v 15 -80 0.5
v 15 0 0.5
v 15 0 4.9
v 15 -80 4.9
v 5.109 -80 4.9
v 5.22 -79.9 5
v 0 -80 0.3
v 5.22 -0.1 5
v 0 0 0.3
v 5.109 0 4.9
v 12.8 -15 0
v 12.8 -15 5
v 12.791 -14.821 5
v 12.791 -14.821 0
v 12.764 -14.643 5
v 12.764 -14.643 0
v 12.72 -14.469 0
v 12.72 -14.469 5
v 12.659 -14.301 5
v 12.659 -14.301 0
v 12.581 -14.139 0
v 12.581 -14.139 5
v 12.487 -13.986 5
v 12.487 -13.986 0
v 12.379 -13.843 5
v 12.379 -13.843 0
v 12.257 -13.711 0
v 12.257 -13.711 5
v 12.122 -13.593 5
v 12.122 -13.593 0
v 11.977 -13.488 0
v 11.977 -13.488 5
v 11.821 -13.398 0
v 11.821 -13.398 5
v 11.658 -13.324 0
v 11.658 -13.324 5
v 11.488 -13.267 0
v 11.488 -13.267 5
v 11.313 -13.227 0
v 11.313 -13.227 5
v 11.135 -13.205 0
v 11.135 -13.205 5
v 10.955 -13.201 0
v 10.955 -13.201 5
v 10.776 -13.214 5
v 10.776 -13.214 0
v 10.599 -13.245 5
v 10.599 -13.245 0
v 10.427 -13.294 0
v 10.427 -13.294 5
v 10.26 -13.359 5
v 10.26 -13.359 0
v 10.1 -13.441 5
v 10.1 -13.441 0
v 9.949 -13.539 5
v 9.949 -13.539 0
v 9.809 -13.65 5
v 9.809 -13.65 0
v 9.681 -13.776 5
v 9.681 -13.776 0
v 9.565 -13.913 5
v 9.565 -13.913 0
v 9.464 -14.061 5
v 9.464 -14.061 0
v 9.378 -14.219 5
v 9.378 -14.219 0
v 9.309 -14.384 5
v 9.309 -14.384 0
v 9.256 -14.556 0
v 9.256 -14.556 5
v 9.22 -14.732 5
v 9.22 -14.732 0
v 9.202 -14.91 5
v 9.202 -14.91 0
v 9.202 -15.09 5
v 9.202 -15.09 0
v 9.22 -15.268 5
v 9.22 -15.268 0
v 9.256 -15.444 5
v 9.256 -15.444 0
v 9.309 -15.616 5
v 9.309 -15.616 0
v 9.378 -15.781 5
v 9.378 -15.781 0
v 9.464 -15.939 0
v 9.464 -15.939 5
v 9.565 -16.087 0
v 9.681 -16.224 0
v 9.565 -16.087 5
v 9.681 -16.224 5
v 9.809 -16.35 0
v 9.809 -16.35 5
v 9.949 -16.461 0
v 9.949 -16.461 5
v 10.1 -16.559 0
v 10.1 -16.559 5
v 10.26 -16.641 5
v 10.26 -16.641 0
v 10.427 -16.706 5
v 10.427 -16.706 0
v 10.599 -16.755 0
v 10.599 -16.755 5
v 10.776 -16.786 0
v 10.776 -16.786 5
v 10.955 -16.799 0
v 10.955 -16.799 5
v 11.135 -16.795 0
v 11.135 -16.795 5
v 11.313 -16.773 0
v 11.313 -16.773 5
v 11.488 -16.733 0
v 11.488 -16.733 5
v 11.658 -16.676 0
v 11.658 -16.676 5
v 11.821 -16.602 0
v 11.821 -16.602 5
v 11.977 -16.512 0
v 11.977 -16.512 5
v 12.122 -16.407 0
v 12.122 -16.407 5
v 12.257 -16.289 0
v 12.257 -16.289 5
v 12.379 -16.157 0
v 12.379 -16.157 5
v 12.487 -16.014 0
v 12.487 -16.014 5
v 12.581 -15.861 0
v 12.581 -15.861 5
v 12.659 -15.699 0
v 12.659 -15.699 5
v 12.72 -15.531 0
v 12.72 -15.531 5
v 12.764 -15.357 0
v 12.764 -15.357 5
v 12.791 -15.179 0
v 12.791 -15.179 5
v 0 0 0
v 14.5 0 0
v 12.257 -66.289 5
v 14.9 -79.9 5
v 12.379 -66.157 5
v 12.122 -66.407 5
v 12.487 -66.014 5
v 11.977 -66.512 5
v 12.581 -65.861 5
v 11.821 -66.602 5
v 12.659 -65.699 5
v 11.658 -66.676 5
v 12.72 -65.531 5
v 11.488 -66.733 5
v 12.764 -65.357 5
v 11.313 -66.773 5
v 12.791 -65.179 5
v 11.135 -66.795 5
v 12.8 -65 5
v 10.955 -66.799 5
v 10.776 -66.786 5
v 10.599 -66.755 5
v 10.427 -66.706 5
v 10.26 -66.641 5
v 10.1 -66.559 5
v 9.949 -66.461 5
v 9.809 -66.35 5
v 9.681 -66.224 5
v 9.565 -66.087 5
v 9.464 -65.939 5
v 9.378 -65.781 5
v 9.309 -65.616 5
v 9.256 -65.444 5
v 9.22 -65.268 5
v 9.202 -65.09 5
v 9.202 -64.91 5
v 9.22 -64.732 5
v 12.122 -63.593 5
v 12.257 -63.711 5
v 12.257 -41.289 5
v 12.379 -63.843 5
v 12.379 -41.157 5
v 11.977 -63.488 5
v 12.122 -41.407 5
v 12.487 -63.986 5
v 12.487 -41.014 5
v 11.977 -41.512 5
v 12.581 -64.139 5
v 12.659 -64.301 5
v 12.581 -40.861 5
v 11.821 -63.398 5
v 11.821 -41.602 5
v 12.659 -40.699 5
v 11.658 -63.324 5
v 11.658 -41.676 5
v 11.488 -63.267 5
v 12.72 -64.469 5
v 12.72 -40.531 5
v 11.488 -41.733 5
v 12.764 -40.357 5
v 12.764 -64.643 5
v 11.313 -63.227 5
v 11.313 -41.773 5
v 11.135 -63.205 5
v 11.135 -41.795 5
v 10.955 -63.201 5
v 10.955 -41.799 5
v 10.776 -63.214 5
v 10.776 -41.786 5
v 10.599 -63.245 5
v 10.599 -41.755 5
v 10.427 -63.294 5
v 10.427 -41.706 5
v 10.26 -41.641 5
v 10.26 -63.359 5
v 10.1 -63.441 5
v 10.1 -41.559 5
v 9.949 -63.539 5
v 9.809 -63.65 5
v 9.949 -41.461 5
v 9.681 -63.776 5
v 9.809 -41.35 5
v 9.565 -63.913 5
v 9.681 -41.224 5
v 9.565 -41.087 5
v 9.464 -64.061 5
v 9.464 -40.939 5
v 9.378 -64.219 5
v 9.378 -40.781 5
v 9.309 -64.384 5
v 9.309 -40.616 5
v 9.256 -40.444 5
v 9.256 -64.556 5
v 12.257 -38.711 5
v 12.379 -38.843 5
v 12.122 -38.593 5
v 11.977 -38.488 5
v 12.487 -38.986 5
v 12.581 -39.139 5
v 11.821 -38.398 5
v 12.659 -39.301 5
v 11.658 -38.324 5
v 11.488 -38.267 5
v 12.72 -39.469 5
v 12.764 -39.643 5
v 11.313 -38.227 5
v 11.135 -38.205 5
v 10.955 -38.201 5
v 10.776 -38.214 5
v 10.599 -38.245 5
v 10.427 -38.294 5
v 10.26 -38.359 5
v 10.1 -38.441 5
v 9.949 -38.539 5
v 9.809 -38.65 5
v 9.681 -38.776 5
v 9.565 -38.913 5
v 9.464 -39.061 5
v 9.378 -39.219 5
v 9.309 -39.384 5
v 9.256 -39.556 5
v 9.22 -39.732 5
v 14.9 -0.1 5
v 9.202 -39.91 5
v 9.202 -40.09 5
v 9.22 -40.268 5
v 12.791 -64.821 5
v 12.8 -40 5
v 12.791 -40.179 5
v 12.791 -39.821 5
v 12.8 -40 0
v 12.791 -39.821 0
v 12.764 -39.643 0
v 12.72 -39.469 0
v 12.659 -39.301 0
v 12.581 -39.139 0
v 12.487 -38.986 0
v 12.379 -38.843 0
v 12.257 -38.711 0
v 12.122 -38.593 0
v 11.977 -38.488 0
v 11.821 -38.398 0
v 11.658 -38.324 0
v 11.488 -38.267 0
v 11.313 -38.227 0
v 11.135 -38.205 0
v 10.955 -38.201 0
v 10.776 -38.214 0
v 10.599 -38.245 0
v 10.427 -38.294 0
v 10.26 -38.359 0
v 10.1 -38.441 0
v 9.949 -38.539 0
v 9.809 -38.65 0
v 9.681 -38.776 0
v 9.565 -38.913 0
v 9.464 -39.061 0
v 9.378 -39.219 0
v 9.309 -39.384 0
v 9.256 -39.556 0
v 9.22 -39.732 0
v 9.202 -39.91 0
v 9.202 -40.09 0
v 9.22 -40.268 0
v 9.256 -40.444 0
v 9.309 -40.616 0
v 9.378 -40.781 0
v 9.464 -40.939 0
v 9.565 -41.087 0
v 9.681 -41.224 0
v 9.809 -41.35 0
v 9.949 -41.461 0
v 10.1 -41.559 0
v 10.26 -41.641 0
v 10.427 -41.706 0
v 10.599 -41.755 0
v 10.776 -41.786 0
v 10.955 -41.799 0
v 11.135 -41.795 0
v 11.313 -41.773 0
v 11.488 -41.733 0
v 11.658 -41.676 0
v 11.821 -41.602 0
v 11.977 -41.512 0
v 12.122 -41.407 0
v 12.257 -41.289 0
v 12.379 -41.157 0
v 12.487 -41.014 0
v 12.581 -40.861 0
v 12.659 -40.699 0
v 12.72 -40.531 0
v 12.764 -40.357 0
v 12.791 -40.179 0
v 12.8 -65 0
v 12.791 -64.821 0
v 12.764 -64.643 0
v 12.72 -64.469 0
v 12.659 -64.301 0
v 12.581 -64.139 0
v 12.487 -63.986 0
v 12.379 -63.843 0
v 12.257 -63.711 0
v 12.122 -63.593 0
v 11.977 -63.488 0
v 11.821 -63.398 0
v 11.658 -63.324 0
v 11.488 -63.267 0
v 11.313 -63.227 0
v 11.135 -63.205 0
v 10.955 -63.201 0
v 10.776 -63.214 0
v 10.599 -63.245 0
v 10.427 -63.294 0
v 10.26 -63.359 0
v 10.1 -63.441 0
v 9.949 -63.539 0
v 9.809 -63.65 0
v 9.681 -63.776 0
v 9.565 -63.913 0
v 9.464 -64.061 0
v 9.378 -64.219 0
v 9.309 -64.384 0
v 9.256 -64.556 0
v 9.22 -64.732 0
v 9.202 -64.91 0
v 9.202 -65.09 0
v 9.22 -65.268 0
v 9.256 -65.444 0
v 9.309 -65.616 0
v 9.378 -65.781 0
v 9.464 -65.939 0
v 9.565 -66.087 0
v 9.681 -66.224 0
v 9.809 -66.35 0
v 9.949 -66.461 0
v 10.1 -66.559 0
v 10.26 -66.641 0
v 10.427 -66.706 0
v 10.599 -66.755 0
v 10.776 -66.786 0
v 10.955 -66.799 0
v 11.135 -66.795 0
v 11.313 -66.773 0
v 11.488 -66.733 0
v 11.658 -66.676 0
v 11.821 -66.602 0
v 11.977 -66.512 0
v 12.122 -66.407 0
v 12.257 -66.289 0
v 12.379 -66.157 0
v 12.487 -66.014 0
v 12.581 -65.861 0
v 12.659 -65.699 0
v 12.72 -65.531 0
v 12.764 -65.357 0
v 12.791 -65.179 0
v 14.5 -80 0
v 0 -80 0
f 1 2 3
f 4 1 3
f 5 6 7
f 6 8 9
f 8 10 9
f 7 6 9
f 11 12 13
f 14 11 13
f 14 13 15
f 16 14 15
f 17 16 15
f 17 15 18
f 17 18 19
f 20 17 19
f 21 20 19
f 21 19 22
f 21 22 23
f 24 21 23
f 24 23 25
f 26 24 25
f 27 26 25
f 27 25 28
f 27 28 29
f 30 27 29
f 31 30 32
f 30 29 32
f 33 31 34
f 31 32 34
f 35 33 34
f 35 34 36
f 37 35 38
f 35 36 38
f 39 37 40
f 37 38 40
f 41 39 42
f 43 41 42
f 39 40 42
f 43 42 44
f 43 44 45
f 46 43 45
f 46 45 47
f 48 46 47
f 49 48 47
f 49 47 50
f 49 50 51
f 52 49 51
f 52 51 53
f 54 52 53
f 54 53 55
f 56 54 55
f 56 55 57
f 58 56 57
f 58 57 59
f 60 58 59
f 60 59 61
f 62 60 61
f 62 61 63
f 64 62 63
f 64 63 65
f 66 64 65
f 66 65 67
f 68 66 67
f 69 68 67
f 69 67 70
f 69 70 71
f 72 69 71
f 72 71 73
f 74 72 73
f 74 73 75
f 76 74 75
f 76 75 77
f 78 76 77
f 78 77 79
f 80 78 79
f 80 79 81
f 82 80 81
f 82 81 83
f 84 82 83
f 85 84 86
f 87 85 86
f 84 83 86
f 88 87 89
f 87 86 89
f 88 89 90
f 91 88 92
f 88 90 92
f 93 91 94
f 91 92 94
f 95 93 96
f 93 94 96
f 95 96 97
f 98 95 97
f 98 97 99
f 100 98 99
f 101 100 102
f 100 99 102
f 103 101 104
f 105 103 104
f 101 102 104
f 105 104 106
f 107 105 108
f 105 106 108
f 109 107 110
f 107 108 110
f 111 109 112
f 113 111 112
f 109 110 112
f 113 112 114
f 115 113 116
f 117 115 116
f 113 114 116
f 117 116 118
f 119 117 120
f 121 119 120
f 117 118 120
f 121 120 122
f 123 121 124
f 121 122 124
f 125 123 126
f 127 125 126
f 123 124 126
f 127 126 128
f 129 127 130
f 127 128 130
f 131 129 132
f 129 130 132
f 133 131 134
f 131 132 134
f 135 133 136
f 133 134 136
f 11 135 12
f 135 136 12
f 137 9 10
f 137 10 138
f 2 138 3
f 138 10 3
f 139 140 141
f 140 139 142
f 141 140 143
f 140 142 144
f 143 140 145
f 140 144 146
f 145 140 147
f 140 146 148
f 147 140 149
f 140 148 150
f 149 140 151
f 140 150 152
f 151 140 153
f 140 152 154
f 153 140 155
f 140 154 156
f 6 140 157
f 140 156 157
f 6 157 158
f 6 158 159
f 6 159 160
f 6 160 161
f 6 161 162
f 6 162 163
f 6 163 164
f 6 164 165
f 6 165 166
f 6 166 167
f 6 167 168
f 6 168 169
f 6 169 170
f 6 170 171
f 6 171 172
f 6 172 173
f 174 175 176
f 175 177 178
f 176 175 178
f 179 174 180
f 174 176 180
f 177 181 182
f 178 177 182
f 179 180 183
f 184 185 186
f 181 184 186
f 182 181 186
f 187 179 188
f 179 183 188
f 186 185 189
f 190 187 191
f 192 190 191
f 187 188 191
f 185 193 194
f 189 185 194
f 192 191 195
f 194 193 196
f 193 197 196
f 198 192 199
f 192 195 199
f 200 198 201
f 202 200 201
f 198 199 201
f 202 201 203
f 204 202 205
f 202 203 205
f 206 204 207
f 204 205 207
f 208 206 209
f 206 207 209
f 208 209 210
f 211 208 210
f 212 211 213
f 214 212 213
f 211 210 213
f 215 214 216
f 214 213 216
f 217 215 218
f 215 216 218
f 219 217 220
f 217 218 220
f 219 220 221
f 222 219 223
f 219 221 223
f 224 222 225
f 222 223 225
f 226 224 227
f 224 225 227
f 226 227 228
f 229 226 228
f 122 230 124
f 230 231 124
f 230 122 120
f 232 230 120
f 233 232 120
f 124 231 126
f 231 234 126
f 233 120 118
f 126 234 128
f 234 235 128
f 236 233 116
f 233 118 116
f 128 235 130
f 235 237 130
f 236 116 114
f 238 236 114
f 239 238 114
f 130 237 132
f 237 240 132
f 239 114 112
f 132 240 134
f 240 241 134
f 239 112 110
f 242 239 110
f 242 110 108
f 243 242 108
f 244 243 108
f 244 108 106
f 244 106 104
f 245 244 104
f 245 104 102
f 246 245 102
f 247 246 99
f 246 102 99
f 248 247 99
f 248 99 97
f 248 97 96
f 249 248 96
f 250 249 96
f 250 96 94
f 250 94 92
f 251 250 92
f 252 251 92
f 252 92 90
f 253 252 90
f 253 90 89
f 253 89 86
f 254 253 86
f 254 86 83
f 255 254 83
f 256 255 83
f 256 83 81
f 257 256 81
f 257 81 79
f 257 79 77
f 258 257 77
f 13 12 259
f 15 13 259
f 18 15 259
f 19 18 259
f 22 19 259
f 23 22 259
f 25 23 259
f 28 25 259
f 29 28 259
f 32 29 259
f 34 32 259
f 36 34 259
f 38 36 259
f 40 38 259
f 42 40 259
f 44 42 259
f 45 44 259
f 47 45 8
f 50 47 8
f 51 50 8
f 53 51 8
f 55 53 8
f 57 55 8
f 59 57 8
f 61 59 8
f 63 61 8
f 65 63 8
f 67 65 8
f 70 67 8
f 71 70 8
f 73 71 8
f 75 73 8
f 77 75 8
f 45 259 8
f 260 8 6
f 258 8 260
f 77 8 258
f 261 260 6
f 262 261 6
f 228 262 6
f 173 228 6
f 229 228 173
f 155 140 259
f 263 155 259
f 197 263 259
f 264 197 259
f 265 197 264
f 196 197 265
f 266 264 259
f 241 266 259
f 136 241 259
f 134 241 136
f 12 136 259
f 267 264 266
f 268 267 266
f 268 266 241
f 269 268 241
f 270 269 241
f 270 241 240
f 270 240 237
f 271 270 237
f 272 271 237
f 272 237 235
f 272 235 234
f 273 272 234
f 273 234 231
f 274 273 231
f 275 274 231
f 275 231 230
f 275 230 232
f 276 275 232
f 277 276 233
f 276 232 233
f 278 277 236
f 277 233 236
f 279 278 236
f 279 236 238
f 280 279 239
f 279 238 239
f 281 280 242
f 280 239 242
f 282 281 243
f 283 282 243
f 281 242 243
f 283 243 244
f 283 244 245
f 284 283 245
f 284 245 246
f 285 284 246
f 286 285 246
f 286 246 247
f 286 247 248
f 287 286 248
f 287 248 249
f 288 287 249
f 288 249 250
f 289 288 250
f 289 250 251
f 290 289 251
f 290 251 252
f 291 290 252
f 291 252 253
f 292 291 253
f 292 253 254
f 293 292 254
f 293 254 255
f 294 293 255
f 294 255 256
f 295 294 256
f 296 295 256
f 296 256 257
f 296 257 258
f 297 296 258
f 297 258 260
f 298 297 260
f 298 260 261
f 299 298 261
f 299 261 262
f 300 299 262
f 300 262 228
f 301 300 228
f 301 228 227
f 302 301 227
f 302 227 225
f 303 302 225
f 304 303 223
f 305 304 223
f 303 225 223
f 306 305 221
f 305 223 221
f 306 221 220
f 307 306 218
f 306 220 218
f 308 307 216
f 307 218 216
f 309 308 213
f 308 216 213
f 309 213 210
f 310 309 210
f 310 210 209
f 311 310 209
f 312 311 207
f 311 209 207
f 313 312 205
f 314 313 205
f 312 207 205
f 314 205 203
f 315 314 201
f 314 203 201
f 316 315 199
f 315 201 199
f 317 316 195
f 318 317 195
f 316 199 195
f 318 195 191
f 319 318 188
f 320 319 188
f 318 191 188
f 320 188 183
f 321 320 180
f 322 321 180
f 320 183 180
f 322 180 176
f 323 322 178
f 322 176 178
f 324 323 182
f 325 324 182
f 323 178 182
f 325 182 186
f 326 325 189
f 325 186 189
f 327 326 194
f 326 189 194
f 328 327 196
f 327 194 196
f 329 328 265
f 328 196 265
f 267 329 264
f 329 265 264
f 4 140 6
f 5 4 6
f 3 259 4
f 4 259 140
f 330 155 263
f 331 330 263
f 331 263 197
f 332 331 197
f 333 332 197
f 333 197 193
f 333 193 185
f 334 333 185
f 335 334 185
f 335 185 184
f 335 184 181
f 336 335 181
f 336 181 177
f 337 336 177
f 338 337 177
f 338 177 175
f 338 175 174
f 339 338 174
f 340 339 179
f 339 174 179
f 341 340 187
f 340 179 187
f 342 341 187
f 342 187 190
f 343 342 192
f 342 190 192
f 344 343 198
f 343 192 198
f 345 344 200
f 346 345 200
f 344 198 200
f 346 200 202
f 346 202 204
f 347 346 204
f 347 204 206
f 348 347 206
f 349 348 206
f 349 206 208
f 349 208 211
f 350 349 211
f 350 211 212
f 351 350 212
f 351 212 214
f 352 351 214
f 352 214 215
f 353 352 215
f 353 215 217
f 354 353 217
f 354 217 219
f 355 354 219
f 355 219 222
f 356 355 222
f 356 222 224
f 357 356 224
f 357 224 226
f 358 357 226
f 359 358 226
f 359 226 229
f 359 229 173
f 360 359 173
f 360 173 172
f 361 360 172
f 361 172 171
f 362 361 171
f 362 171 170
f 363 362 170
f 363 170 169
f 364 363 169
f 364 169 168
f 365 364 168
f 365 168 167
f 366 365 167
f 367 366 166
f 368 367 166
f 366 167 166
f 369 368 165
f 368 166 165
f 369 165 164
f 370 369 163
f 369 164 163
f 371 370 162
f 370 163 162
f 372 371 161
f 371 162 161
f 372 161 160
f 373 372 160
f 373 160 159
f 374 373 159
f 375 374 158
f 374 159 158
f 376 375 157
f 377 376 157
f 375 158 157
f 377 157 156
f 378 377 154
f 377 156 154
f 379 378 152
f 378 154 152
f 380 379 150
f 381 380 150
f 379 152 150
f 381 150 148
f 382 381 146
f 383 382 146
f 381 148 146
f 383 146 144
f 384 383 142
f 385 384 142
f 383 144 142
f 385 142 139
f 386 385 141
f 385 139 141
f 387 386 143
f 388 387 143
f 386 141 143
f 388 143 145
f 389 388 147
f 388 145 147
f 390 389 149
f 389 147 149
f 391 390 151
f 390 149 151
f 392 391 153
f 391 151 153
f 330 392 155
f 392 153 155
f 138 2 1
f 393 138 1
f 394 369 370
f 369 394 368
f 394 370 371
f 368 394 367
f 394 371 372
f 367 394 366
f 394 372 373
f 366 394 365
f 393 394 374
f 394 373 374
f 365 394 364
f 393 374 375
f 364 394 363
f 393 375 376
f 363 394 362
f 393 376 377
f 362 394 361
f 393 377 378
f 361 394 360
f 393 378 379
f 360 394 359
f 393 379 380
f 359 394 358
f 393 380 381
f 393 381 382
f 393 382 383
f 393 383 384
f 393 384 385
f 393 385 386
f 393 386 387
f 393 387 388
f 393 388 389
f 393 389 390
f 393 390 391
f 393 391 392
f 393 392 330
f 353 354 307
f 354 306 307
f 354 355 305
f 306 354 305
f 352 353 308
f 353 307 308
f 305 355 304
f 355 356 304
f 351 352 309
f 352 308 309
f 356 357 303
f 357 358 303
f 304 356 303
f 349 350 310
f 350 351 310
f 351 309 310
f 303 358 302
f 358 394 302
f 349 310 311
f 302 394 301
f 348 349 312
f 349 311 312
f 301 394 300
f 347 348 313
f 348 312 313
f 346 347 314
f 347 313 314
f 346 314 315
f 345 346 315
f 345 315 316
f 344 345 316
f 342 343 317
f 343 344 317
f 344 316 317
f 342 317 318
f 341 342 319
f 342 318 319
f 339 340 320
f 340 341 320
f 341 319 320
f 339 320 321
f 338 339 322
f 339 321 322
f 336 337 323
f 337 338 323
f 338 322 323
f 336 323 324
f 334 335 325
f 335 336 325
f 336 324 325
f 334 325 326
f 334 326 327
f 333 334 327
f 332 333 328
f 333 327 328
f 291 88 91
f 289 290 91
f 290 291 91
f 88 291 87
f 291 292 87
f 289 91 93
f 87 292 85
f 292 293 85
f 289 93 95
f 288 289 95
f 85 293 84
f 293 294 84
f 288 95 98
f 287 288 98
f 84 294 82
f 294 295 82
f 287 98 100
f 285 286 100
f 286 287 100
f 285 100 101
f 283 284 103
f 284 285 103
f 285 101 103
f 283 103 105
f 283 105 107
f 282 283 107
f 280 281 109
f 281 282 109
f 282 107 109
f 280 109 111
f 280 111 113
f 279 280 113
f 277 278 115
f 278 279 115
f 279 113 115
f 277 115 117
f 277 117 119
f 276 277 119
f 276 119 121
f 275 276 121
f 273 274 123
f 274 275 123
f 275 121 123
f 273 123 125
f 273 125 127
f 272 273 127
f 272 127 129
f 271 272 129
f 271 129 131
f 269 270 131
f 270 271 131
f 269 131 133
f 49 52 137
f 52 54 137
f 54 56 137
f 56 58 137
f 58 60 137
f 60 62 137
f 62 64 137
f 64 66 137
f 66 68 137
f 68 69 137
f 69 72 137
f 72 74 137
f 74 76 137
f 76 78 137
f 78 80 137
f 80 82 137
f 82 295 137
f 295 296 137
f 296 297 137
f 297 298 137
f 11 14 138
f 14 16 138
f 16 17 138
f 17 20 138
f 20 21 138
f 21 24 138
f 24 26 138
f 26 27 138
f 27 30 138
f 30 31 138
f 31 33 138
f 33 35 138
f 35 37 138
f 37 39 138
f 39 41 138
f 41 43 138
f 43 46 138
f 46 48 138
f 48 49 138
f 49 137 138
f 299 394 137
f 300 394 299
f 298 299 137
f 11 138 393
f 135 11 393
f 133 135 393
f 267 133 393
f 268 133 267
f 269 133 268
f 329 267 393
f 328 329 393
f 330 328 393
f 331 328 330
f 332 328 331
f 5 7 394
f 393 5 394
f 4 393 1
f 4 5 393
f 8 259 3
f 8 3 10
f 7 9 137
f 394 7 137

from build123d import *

# Parameters (mm, degrees)
F1_DEPTH = 80
F2_R     = 1.8
F3_DEPTH = 5.001
F4_SIZE  = 0.5
F5_SIZE  = 0.1


with BuildPart() as f1:
    # F0 (on Front) → F1 (new body)
    with BuildSketch(Plane.XZ):
        Polygon((0, 0.3), (0, 0), (15, 0), (15, 5), (5.219879, 5), align=None)
    extrude(amount=F1_DEPTH)

    # F2 (on face) → F3 (cut, through all)
    with BuildSketch(Plane.XY.offset(5)):
        with Locations((11, -40)):
            Circle(F2_R)
        with Locations((11, -15)):
            Circle(F2_R)
        with Locations((11, -65)):
            Circle(F2_R)
    extrude(amount=-F3_DEPTH, mode=Mode.SUBTRACT)

    # F4
    f4_edges = [f1.edges().sort_by_distance(p)[0] for p in [
        (15, -40, 0),
    ]]
    chamfer(f4_edges, length=F4_SIZE)

    # F5
    f5_edges = [f1.edges().sort_by_distance(p)[0] for p in [
        (15, -40, 5),
        (10.109939, -80, 5),
        (10.109939, 0, 5),
    ]]
    chamfer(f5_edges, length=F5_SIZE)


solid = f1.part
